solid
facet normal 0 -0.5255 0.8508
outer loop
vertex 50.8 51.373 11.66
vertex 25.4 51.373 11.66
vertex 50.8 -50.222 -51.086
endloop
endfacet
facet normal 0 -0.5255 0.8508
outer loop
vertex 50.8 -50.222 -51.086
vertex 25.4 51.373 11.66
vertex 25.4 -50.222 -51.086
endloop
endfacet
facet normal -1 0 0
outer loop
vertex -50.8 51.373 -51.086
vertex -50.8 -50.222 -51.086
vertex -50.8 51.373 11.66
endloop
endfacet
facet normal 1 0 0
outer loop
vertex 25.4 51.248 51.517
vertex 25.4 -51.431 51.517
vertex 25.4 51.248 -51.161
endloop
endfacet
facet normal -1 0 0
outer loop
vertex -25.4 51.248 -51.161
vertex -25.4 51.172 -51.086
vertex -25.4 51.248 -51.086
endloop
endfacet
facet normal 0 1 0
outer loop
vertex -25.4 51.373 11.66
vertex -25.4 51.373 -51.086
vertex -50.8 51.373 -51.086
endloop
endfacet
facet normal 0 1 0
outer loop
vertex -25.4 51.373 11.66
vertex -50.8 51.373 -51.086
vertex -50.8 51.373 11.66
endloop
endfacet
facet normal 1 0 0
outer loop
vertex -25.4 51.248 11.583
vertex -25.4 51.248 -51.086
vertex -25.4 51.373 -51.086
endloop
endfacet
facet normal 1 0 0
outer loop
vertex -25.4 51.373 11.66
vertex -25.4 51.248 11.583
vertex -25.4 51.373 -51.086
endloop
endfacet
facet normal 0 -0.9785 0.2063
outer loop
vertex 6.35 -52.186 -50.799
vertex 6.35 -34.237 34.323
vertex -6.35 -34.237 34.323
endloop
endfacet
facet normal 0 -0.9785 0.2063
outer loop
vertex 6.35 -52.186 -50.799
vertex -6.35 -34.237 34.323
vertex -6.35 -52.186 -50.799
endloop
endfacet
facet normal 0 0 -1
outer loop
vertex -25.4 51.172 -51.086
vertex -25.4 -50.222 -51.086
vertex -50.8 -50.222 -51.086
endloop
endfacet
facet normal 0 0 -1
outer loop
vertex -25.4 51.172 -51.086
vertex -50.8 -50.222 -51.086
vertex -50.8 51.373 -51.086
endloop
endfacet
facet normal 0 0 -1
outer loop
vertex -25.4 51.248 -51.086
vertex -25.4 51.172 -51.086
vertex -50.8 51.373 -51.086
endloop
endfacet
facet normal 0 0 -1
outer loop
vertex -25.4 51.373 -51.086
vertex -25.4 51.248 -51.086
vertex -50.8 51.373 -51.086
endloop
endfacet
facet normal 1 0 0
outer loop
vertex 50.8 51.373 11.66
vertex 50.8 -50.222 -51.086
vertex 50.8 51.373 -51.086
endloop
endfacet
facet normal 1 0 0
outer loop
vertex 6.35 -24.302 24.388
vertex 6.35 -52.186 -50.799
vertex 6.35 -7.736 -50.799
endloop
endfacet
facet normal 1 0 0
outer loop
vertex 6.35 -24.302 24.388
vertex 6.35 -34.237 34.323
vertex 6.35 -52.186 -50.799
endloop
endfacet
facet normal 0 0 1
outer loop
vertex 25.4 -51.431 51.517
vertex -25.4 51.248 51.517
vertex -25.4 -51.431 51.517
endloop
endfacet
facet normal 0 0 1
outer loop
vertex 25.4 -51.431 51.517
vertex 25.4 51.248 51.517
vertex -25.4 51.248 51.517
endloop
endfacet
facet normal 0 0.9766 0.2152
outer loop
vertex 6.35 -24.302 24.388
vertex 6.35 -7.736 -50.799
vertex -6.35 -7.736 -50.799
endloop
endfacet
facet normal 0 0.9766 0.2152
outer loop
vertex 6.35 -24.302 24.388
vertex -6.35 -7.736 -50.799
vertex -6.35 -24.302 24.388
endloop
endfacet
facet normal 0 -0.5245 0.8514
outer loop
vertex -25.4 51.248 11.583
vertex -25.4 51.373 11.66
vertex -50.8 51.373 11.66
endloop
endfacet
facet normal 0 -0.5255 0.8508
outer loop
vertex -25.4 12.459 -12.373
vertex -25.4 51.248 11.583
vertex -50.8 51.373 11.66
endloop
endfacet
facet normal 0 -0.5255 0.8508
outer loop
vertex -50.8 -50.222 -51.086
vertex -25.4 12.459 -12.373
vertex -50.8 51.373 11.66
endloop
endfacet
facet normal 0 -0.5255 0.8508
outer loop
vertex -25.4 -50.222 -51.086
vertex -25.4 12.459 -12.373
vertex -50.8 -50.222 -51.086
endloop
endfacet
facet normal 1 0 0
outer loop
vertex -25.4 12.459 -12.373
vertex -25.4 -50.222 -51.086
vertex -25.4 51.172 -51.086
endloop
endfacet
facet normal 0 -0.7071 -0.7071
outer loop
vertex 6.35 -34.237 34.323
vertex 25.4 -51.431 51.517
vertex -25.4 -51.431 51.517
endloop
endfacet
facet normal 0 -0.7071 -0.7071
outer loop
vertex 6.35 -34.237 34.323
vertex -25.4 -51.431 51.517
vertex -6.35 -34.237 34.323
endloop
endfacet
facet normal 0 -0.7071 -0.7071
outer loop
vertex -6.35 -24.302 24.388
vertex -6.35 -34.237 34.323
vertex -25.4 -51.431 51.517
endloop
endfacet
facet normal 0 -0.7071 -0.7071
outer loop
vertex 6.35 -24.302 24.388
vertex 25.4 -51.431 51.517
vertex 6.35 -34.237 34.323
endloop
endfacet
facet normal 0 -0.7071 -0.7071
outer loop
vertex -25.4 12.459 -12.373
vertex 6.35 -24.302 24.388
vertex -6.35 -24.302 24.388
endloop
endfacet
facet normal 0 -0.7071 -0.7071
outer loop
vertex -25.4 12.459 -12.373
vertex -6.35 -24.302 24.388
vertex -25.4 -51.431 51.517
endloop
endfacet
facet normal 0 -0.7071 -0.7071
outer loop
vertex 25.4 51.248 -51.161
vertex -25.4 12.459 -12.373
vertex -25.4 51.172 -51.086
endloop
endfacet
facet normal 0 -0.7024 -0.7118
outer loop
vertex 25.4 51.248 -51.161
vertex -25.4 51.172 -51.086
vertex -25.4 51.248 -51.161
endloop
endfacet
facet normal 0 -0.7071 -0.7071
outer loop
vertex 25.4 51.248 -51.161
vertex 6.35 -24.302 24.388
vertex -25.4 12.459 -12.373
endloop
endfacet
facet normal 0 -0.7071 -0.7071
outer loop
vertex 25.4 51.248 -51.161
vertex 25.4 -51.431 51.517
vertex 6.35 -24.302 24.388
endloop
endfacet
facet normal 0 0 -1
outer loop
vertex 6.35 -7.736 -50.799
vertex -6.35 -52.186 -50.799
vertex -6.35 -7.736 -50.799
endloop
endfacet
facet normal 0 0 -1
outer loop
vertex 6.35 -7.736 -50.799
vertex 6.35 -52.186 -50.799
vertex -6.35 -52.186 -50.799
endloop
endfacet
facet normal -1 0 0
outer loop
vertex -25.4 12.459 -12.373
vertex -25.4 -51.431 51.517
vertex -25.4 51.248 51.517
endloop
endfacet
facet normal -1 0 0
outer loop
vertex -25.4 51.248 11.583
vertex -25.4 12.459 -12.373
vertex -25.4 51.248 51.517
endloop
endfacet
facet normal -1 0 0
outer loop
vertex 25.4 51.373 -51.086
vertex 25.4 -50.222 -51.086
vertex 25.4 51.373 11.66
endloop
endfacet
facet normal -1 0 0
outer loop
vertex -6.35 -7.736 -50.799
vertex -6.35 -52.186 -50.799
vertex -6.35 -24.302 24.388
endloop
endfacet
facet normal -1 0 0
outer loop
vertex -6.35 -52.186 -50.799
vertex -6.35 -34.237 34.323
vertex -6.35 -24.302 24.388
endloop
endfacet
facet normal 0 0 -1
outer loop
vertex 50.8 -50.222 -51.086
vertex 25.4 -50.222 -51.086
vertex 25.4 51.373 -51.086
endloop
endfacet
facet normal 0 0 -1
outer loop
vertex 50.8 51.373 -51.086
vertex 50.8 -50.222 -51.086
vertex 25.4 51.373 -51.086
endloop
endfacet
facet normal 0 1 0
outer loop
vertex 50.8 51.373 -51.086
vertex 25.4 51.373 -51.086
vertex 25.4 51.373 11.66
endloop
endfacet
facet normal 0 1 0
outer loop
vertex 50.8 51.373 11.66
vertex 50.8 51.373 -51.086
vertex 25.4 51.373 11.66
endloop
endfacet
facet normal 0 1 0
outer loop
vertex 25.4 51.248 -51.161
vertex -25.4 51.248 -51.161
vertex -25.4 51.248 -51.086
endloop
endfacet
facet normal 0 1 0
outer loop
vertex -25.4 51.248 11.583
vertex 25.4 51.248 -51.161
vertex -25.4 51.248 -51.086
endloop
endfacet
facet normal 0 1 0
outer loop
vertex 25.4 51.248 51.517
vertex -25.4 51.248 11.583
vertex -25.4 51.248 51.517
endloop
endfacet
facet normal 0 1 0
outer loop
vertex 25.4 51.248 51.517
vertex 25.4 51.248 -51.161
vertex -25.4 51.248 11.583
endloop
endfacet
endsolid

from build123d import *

# Parameters (mm, degrees)
F1_DEPTH = 25.4
F3_DEPTH = 6.35
F5_START = 25.4
F5_DEPTH = 25.4
F6_START = -25.4
F6_DEPTH = 25.4


with BuildPart() as f1:
    # F0 (on Right) → F1 (new body, symmetric)
    with BuildSketch(Plane.YZ):
        Polygon((51.2476228178, 51.5168197453), (0, 51.5168197453), (-51.4305755496, 51.5168197453), (51.2476228178, -51.1613786221), align=None)
    extrude(amount=F1_DEPTH, both=True)

    # F2 (on Right) → F3 (join, symmetric)
    with BuildSketch(Plane.YZ):
        Polygon((-7.7362581372, -50.7985763252), (-26.7862581372, 35.6628969312), (-33.1362581372, 39.5409651101), (-52.1862581372, -50.7985763252), align=None)
    extrude(amount=F3_DEPTH, both=True)

    # F4 (on Right) → F6 (join)
    with BuildSketch(Plane.YZ.offset(F6_START)):
        Polygon((51.3733252883, -51.0855205357), (51.3733252883, 0), (51.3733252883, 11.660495895), (-50.2221062779, -51.0855205357), align=None)
    extrude(amount=-F6_DEPTH)


with BuildPart() as f5:
    # F4 (on Right) → F5 (new body)
    with BuildSketch(Plane.YZ.offset(F5_START)):
        Polygon((51.3733252883, -51.0855205357), (51.3733252883, 0), (51.3733252883, 11.660495895), (-50.2221062779, -51.0855205357), align=None)
    extrude(amount=F5_DEPTH)


solid = Compound([f1.part, f5.part])
